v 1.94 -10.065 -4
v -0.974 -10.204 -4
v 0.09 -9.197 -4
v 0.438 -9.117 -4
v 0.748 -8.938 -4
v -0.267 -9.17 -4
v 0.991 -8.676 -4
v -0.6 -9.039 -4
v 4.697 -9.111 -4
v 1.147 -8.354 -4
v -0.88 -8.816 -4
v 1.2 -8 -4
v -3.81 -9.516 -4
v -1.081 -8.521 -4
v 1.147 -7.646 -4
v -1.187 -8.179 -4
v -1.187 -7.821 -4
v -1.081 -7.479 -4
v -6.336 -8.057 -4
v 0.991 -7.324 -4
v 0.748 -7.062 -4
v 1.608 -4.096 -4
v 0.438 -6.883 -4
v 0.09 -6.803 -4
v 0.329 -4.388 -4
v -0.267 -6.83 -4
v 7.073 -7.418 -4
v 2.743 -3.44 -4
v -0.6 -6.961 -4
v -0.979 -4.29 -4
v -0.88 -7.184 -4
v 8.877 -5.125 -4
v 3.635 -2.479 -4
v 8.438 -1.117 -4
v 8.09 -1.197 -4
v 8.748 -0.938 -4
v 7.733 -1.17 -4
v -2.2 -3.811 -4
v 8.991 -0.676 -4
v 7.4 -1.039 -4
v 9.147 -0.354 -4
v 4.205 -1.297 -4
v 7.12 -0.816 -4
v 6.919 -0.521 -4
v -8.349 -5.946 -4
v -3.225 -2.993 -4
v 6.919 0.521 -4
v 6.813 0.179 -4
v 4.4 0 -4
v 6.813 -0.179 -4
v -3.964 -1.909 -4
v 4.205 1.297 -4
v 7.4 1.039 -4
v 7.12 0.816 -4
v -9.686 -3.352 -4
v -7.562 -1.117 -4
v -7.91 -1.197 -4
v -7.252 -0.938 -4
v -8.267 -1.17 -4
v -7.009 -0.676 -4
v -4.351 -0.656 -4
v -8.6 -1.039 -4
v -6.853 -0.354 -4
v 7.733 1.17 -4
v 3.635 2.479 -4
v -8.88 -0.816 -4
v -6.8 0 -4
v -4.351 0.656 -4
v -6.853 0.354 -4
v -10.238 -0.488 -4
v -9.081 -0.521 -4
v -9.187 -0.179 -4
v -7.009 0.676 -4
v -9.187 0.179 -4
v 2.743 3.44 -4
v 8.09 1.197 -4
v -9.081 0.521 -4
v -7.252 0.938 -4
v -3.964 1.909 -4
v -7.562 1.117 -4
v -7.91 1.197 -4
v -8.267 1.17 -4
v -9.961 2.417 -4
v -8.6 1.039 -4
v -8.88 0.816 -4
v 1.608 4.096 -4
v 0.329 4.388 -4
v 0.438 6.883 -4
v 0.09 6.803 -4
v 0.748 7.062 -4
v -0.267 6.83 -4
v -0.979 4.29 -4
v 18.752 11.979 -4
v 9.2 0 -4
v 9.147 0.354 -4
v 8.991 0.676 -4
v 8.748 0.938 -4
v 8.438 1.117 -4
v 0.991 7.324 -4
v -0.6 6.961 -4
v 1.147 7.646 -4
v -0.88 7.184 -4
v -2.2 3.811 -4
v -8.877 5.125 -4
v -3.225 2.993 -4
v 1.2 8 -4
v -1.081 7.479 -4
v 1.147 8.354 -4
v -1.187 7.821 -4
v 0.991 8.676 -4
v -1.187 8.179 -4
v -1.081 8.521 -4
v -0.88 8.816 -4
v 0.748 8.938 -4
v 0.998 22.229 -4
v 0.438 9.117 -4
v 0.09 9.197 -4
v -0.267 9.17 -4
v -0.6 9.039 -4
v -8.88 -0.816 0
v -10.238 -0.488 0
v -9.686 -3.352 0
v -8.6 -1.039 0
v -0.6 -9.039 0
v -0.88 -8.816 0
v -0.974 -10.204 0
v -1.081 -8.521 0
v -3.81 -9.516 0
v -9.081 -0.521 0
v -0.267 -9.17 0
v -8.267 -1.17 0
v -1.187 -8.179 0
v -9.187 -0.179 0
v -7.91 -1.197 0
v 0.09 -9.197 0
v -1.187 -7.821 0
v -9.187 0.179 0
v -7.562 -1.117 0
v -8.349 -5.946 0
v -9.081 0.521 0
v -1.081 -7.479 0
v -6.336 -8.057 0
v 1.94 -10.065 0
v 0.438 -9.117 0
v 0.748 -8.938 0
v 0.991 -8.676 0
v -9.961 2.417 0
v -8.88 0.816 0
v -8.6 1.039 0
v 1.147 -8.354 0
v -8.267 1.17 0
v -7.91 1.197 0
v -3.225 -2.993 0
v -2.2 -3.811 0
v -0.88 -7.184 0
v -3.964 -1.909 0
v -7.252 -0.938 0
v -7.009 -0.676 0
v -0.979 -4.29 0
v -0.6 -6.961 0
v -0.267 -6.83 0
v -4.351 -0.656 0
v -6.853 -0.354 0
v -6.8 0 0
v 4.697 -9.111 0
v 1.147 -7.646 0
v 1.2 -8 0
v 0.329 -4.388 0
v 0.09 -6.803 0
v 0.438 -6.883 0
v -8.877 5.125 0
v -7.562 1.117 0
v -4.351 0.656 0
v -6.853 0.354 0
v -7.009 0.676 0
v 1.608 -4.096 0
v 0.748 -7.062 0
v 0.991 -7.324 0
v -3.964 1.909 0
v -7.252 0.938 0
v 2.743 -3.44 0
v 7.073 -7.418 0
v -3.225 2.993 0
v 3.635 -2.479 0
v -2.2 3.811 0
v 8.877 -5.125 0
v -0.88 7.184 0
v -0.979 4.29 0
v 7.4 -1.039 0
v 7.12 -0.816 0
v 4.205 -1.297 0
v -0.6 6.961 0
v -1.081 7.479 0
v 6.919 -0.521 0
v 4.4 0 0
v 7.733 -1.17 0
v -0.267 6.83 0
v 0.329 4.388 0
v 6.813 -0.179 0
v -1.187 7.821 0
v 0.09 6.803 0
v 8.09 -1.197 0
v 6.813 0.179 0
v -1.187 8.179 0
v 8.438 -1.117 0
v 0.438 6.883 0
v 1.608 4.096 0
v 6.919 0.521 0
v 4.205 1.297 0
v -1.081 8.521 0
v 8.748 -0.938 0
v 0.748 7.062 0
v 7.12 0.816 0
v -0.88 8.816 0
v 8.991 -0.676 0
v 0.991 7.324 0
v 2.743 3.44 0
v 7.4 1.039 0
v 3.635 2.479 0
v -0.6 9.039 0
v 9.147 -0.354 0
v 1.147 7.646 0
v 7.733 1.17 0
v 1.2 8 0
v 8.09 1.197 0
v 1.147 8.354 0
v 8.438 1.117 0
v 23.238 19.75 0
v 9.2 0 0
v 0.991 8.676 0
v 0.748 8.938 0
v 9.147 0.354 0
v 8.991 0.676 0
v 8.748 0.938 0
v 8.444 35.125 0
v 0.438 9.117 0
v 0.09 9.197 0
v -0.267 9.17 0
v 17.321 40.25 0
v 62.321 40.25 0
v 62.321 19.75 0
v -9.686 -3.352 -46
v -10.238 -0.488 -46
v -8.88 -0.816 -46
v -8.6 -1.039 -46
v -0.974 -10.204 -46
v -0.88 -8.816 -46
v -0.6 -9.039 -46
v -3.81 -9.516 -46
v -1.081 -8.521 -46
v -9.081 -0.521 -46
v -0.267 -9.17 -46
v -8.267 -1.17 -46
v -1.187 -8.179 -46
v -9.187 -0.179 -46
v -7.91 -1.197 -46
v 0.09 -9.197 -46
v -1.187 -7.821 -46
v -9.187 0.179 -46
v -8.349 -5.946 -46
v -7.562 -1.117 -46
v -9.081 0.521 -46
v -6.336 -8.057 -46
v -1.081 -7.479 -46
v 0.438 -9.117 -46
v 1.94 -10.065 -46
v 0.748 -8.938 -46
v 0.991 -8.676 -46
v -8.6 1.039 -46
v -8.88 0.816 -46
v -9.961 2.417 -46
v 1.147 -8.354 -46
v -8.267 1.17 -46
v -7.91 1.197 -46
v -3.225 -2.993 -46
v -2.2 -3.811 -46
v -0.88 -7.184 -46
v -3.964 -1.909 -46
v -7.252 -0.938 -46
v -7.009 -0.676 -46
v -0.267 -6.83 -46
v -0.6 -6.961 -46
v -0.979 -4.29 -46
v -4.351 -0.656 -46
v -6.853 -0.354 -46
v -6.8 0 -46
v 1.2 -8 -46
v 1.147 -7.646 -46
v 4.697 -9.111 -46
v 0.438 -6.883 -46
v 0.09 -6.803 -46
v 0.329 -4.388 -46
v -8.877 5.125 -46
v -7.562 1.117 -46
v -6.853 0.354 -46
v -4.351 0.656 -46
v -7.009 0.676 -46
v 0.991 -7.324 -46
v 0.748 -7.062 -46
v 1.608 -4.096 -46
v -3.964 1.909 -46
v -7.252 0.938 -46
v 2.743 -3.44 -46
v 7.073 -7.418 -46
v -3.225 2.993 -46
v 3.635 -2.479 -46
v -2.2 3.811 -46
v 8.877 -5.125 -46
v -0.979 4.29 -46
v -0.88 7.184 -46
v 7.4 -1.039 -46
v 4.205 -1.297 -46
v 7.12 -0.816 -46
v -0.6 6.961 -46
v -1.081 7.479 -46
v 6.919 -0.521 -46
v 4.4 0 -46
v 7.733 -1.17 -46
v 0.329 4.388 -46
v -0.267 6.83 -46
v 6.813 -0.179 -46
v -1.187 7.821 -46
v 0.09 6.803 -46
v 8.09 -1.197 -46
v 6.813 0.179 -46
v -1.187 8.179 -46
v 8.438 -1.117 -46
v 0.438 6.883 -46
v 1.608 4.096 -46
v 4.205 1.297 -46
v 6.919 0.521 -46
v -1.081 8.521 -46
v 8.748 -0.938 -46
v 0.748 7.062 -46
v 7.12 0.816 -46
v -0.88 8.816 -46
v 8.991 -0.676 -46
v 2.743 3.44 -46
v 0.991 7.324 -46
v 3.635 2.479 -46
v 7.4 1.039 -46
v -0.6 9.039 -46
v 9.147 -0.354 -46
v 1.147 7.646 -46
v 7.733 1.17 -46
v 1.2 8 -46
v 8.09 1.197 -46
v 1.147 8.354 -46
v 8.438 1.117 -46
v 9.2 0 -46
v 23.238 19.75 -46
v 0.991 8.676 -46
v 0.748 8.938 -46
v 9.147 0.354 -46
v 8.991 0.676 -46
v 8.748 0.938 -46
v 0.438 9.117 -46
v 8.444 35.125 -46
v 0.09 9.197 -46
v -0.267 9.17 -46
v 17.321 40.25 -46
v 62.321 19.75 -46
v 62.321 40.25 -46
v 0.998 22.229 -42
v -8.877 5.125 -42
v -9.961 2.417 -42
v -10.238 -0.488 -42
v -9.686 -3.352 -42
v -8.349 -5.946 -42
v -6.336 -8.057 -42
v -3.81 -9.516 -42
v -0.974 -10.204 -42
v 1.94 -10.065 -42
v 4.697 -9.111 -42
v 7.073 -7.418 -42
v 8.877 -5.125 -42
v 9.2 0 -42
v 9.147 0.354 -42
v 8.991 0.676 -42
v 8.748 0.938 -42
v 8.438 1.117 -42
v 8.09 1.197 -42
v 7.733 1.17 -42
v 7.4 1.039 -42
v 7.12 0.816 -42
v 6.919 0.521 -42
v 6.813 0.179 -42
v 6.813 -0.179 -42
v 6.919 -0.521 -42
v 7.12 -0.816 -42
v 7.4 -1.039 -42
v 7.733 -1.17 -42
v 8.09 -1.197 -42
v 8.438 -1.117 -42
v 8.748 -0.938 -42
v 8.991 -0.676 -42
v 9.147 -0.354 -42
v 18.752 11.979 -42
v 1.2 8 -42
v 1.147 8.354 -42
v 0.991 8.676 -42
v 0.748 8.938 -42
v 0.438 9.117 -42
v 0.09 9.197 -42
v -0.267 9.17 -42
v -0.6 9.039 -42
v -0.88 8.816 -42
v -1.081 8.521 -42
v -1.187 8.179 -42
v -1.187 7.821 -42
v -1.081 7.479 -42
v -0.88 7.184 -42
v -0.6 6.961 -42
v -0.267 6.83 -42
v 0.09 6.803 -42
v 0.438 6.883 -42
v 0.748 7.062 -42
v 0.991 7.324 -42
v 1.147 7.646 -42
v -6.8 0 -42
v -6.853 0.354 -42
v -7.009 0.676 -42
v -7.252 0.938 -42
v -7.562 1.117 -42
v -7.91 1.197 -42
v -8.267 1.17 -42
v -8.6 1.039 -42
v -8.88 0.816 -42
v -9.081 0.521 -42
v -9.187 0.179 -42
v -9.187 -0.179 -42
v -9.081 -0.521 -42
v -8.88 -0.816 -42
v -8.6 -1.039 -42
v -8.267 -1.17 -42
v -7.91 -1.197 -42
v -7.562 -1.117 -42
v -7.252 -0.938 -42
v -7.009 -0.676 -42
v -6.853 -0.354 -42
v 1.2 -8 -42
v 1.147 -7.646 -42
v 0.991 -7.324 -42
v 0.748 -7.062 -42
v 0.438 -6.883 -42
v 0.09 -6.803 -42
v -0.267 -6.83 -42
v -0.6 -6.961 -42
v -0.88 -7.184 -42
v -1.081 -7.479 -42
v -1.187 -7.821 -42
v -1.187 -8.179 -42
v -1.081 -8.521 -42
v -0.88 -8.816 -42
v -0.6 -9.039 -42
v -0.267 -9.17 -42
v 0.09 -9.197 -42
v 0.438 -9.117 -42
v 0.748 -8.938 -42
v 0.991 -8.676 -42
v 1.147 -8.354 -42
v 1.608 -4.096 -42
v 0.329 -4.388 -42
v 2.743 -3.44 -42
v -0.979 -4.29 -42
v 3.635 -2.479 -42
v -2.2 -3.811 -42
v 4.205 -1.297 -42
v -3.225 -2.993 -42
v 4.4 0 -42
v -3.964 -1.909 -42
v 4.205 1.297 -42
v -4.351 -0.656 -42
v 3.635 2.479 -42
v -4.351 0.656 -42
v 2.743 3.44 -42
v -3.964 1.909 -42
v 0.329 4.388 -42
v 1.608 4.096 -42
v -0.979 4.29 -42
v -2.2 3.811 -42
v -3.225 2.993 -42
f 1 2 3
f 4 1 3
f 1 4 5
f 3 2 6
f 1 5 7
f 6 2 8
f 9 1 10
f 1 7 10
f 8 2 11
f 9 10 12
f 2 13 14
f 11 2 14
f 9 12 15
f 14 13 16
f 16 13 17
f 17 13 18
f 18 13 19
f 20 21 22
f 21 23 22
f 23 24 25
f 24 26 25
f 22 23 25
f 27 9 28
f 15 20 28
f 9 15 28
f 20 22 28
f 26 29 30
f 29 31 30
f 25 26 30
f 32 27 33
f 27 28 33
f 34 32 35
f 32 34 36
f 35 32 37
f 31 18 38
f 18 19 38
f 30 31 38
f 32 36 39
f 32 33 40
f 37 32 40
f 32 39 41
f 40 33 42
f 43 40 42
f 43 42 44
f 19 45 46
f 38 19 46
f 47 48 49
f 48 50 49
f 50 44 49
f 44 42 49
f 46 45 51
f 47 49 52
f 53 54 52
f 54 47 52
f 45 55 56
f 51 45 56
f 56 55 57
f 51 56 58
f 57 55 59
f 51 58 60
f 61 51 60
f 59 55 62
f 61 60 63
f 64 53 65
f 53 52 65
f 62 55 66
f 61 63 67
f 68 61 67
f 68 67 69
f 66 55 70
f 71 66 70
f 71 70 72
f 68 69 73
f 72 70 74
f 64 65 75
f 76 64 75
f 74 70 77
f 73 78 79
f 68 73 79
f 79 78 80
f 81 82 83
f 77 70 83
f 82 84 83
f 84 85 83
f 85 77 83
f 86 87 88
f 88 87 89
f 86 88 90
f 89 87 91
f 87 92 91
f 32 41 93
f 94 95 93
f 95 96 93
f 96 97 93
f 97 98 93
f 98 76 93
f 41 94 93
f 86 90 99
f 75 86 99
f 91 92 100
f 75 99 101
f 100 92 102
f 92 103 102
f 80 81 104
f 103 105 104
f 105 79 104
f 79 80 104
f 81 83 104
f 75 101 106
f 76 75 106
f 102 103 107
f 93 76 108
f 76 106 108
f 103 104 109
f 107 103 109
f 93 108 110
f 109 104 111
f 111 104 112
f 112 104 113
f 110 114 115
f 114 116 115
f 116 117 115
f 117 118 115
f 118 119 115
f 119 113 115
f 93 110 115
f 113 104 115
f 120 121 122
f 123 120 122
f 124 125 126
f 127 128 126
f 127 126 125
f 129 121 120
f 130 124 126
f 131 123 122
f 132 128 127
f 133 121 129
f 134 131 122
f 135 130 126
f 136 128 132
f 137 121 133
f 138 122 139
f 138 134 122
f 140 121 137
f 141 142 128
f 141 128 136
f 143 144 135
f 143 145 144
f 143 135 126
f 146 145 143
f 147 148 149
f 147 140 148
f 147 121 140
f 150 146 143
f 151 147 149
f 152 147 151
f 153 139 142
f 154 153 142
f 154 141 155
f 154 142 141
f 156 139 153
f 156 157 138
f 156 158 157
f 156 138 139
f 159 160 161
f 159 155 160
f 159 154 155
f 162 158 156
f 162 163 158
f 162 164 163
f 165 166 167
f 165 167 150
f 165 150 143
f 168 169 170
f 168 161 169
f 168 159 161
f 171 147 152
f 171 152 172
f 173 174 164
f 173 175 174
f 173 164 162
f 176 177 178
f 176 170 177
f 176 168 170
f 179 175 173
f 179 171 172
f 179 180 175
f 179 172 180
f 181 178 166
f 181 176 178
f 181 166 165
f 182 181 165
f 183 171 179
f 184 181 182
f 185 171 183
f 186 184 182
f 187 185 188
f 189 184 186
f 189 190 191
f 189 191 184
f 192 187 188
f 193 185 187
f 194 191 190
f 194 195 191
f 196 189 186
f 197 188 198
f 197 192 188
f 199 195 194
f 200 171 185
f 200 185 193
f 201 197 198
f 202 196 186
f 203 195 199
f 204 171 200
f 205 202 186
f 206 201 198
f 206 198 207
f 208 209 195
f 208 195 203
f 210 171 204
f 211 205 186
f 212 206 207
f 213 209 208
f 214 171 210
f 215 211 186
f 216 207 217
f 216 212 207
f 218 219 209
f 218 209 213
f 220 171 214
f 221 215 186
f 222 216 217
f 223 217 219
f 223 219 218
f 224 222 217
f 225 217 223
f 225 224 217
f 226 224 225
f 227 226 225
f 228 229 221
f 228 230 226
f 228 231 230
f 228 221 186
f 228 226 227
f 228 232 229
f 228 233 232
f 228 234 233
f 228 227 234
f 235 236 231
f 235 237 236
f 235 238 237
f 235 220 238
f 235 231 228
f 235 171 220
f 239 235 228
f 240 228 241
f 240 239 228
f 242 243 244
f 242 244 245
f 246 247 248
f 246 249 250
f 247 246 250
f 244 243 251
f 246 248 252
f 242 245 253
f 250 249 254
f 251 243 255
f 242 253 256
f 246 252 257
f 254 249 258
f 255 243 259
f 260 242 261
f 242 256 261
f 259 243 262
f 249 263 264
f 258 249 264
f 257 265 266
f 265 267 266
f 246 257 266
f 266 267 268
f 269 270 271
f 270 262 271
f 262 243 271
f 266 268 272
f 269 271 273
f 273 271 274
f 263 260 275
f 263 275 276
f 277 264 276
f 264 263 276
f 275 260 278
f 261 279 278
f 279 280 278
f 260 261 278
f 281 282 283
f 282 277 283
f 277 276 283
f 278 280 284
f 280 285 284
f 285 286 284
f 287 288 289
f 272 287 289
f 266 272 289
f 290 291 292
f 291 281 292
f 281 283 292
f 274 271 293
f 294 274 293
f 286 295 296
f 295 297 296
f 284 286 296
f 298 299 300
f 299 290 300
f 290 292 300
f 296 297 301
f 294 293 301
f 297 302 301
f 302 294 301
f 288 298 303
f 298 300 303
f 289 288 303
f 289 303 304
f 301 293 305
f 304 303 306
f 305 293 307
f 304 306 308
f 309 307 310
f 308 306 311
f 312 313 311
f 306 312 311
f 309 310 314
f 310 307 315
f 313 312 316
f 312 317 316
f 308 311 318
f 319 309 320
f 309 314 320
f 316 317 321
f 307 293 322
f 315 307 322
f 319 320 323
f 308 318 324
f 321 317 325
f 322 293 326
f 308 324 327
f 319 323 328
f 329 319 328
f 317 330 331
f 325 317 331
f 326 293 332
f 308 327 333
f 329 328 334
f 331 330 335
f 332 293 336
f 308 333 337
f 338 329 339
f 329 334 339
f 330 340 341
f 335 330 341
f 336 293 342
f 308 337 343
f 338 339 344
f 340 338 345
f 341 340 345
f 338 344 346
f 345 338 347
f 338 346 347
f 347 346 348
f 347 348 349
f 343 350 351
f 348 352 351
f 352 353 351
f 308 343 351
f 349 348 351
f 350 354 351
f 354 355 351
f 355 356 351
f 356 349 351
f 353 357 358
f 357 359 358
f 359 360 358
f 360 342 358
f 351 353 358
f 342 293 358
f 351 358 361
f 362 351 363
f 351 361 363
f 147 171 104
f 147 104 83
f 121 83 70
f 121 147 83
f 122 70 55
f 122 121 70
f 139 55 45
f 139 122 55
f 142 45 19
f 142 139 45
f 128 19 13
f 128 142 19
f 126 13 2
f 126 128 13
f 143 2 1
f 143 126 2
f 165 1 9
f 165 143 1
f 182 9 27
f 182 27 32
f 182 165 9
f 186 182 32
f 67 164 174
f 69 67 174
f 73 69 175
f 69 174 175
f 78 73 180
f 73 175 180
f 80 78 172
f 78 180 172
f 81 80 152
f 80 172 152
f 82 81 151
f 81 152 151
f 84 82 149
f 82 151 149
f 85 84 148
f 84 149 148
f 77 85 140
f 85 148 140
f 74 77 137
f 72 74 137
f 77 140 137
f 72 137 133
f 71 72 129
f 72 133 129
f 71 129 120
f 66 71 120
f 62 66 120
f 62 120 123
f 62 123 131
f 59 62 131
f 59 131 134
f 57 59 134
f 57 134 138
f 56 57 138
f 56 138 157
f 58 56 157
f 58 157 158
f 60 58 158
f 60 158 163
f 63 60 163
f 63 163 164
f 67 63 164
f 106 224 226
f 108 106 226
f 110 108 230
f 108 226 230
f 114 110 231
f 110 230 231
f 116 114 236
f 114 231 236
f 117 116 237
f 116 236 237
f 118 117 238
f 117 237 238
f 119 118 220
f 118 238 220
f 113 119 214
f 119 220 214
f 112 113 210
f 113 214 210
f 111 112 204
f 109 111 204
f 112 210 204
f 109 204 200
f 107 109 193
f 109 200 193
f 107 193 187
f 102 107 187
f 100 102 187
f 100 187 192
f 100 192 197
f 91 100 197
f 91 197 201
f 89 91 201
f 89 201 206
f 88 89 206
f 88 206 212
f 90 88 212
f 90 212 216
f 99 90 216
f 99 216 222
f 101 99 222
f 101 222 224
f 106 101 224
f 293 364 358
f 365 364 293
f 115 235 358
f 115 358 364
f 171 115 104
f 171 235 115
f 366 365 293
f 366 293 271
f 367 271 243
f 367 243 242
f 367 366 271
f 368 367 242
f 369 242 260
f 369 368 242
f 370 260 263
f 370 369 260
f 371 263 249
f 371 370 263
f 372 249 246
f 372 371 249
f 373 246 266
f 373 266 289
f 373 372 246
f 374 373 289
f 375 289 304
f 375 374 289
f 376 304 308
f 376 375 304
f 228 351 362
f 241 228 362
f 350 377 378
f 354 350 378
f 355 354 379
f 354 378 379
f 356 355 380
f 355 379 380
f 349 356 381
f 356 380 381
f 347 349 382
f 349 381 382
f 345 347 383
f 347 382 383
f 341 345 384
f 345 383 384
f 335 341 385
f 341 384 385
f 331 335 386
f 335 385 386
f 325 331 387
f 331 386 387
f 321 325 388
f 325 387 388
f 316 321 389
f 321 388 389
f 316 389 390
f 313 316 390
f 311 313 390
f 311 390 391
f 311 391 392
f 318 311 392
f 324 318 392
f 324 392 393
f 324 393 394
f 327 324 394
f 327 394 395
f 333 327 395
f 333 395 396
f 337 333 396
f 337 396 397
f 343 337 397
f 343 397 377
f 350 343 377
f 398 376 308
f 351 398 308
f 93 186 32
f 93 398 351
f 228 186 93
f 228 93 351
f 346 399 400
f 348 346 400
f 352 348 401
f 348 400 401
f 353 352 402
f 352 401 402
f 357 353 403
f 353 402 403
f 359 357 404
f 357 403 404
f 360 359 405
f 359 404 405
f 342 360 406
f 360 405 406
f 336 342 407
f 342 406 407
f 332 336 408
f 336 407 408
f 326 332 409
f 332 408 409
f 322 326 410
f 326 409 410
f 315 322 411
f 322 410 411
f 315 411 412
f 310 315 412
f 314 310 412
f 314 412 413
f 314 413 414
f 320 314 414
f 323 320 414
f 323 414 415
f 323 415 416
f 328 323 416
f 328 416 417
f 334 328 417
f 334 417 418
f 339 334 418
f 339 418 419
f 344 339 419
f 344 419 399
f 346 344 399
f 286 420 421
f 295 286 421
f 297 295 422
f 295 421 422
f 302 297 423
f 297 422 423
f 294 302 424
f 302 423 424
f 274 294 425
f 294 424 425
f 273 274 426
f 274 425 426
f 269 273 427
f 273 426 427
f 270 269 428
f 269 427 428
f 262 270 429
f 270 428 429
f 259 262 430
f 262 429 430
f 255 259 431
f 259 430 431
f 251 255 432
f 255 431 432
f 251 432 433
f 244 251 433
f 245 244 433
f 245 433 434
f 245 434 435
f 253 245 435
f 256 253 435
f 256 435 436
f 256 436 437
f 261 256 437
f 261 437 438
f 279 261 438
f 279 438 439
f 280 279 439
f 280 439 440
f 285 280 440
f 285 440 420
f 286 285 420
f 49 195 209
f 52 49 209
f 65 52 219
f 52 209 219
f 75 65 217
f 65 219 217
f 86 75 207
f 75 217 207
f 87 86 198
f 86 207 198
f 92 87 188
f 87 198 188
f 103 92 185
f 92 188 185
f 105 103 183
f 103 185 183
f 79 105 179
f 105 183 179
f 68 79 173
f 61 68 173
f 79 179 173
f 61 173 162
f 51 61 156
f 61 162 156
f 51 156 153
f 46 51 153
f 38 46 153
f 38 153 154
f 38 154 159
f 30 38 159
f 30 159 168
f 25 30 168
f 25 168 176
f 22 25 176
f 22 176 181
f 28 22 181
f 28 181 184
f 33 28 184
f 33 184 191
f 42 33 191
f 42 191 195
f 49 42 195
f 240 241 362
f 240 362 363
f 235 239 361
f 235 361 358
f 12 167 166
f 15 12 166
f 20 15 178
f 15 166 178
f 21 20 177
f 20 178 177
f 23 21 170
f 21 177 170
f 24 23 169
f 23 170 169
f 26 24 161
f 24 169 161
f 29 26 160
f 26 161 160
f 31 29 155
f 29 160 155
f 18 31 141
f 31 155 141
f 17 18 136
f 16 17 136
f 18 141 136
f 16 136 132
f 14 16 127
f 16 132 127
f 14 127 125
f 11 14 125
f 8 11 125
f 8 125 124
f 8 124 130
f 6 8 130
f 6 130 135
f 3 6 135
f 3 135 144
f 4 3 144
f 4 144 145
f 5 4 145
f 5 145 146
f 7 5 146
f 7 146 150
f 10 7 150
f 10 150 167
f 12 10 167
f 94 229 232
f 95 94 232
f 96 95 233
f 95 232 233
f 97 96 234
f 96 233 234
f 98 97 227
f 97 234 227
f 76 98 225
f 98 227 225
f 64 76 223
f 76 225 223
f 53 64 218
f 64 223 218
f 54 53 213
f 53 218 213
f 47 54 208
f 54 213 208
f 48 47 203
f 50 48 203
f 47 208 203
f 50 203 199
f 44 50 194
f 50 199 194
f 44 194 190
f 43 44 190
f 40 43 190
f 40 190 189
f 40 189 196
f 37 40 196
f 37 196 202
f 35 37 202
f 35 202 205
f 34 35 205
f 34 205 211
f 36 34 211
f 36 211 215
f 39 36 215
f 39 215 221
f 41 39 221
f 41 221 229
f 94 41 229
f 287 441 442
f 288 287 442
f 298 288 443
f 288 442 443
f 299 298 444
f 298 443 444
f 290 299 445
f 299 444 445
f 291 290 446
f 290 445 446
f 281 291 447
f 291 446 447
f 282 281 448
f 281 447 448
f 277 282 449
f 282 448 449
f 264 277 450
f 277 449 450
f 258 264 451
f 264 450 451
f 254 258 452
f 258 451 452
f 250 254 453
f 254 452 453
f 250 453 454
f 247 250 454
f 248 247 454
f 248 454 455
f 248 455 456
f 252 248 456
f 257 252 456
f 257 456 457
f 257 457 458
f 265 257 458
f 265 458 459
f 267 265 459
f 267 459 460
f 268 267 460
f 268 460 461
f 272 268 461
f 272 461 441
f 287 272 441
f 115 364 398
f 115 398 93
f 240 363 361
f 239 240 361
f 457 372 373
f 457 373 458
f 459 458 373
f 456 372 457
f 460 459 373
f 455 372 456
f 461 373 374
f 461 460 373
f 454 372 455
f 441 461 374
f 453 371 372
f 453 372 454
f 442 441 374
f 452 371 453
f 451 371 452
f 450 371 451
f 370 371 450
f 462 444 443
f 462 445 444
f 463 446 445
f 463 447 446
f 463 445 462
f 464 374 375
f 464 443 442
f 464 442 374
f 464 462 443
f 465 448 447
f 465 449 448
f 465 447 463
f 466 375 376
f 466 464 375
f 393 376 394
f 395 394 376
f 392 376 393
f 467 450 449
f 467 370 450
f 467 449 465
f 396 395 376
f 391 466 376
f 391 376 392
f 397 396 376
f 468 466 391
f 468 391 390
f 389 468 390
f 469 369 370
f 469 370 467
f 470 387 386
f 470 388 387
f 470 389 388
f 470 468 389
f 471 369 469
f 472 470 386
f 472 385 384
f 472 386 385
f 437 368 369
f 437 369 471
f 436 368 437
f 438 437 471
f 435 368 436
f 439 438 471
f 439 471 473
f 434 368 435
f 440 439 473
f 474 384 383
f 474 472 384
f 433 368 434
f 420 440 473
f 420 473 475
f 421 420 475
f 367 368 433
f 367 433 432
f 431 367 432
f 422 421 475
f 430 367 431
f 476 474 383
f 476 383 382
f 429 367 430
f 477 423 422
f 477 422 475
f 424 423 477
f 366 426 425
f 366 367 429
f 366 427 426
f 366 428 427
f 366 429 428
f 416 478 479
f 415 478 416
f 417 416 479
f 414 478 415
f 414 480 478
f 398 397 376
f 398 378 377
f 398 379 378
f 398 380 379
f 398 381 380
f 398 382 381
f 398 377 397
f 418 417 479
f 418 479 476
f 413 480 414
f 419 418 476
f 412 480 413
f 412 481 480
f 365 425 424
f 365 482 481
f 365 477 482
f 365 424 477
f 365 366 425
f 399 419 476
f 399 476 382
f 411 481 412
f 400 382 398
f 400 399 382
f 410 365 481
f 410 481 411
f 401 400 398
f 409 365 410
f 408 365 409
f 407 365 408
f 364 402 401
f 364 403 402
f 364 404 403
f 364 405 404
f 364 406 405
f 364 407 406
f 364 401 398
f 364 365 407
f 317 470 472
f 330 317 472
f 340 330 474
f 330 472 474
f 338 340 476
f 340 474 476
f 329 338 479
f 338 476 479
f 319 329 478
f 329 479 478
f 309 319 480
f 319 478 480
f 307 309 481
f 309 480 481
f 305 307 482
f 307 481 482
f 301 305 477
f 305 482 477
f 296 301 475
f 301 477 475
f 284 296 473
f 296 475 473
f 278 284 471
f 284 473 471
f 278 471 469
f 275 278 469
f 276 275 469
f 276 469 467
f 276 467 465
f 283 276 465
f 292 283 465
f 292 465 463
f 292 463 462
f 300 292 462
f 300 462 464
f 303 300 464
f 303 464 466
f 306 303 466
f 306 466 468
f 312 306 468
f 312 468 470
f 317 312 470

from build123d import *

# Parameters (mm, degrees)
SKETCH1_R           = 1.2
SKETCH1_R_2         = 4.4
BOSS_EXTRUDE1_DEPTH = 46
SKETCH4_W           = 38
SKETCH4_H           = 30
CUT_EXTRUDE1_DEPTH  = 46


with BuildPart() as part:
    # Sketch1 → Boss-Extrude1 (new body)
    with BuildSketch(Plane.XY):
        with BuildLine():
            Line((8.443747687, 35.125), (-8.876760389, 5.125))
            ThreePointArc((-8.876760389, 5.125), (-5.125, -8.876760389), (8.876760389, -5.125))
            Line((8.876760389, -5.125), (23.238348335, 19.75))
            Line((23.238348335, 19.75), (62.320508076, 19.75))
            Line((62.320508076, 19.75), (62.320508076, 40.25))
            Line((62.320508076, 40.25), (17.320508076, 40.25))
            Line((17.320508076, 40.25), (8.443747687, 35.125))
        make_face()
        with Locations((0, -8)):
            Circle(SKETCH1_R, mode=Mode.SUBTRACT)
        Circle(SKETCH1_R_2, mode=Mode.SUBTRACT)
        with Locations((8, 0)):
            Circle(SKETCH1_R, mode=Mode.SUBTRACT)
        with Locations((-8, 0)):
            Circle(SKETCH1_R, mode=Mode.SUBTRACT)
        with Locations((0, 8)):
            Circle(SKETCH1_R, mode=Mode.SUBTRACT)
    extrude(amount=-BOSS_EXTRUDE1_DEPTH)

    # Sketch4 → Cut-Extrude1 (cut)
    with BuildSketch(Plane(origin=(-8.876760389, 5.125, 0), x_dir=(0, 0, 1), z_dir=(-0.8660254037844382, 0.5000000000000009, 0))):
        with Locations((-23, 4.75)):
            Rectangle(SKETCH4_W, SKETCH4_H)
    extrude(amount=-CUT_EXTRUDE1_DEPTH, mode=Mode.SUBTRACT)


solid = part.part
